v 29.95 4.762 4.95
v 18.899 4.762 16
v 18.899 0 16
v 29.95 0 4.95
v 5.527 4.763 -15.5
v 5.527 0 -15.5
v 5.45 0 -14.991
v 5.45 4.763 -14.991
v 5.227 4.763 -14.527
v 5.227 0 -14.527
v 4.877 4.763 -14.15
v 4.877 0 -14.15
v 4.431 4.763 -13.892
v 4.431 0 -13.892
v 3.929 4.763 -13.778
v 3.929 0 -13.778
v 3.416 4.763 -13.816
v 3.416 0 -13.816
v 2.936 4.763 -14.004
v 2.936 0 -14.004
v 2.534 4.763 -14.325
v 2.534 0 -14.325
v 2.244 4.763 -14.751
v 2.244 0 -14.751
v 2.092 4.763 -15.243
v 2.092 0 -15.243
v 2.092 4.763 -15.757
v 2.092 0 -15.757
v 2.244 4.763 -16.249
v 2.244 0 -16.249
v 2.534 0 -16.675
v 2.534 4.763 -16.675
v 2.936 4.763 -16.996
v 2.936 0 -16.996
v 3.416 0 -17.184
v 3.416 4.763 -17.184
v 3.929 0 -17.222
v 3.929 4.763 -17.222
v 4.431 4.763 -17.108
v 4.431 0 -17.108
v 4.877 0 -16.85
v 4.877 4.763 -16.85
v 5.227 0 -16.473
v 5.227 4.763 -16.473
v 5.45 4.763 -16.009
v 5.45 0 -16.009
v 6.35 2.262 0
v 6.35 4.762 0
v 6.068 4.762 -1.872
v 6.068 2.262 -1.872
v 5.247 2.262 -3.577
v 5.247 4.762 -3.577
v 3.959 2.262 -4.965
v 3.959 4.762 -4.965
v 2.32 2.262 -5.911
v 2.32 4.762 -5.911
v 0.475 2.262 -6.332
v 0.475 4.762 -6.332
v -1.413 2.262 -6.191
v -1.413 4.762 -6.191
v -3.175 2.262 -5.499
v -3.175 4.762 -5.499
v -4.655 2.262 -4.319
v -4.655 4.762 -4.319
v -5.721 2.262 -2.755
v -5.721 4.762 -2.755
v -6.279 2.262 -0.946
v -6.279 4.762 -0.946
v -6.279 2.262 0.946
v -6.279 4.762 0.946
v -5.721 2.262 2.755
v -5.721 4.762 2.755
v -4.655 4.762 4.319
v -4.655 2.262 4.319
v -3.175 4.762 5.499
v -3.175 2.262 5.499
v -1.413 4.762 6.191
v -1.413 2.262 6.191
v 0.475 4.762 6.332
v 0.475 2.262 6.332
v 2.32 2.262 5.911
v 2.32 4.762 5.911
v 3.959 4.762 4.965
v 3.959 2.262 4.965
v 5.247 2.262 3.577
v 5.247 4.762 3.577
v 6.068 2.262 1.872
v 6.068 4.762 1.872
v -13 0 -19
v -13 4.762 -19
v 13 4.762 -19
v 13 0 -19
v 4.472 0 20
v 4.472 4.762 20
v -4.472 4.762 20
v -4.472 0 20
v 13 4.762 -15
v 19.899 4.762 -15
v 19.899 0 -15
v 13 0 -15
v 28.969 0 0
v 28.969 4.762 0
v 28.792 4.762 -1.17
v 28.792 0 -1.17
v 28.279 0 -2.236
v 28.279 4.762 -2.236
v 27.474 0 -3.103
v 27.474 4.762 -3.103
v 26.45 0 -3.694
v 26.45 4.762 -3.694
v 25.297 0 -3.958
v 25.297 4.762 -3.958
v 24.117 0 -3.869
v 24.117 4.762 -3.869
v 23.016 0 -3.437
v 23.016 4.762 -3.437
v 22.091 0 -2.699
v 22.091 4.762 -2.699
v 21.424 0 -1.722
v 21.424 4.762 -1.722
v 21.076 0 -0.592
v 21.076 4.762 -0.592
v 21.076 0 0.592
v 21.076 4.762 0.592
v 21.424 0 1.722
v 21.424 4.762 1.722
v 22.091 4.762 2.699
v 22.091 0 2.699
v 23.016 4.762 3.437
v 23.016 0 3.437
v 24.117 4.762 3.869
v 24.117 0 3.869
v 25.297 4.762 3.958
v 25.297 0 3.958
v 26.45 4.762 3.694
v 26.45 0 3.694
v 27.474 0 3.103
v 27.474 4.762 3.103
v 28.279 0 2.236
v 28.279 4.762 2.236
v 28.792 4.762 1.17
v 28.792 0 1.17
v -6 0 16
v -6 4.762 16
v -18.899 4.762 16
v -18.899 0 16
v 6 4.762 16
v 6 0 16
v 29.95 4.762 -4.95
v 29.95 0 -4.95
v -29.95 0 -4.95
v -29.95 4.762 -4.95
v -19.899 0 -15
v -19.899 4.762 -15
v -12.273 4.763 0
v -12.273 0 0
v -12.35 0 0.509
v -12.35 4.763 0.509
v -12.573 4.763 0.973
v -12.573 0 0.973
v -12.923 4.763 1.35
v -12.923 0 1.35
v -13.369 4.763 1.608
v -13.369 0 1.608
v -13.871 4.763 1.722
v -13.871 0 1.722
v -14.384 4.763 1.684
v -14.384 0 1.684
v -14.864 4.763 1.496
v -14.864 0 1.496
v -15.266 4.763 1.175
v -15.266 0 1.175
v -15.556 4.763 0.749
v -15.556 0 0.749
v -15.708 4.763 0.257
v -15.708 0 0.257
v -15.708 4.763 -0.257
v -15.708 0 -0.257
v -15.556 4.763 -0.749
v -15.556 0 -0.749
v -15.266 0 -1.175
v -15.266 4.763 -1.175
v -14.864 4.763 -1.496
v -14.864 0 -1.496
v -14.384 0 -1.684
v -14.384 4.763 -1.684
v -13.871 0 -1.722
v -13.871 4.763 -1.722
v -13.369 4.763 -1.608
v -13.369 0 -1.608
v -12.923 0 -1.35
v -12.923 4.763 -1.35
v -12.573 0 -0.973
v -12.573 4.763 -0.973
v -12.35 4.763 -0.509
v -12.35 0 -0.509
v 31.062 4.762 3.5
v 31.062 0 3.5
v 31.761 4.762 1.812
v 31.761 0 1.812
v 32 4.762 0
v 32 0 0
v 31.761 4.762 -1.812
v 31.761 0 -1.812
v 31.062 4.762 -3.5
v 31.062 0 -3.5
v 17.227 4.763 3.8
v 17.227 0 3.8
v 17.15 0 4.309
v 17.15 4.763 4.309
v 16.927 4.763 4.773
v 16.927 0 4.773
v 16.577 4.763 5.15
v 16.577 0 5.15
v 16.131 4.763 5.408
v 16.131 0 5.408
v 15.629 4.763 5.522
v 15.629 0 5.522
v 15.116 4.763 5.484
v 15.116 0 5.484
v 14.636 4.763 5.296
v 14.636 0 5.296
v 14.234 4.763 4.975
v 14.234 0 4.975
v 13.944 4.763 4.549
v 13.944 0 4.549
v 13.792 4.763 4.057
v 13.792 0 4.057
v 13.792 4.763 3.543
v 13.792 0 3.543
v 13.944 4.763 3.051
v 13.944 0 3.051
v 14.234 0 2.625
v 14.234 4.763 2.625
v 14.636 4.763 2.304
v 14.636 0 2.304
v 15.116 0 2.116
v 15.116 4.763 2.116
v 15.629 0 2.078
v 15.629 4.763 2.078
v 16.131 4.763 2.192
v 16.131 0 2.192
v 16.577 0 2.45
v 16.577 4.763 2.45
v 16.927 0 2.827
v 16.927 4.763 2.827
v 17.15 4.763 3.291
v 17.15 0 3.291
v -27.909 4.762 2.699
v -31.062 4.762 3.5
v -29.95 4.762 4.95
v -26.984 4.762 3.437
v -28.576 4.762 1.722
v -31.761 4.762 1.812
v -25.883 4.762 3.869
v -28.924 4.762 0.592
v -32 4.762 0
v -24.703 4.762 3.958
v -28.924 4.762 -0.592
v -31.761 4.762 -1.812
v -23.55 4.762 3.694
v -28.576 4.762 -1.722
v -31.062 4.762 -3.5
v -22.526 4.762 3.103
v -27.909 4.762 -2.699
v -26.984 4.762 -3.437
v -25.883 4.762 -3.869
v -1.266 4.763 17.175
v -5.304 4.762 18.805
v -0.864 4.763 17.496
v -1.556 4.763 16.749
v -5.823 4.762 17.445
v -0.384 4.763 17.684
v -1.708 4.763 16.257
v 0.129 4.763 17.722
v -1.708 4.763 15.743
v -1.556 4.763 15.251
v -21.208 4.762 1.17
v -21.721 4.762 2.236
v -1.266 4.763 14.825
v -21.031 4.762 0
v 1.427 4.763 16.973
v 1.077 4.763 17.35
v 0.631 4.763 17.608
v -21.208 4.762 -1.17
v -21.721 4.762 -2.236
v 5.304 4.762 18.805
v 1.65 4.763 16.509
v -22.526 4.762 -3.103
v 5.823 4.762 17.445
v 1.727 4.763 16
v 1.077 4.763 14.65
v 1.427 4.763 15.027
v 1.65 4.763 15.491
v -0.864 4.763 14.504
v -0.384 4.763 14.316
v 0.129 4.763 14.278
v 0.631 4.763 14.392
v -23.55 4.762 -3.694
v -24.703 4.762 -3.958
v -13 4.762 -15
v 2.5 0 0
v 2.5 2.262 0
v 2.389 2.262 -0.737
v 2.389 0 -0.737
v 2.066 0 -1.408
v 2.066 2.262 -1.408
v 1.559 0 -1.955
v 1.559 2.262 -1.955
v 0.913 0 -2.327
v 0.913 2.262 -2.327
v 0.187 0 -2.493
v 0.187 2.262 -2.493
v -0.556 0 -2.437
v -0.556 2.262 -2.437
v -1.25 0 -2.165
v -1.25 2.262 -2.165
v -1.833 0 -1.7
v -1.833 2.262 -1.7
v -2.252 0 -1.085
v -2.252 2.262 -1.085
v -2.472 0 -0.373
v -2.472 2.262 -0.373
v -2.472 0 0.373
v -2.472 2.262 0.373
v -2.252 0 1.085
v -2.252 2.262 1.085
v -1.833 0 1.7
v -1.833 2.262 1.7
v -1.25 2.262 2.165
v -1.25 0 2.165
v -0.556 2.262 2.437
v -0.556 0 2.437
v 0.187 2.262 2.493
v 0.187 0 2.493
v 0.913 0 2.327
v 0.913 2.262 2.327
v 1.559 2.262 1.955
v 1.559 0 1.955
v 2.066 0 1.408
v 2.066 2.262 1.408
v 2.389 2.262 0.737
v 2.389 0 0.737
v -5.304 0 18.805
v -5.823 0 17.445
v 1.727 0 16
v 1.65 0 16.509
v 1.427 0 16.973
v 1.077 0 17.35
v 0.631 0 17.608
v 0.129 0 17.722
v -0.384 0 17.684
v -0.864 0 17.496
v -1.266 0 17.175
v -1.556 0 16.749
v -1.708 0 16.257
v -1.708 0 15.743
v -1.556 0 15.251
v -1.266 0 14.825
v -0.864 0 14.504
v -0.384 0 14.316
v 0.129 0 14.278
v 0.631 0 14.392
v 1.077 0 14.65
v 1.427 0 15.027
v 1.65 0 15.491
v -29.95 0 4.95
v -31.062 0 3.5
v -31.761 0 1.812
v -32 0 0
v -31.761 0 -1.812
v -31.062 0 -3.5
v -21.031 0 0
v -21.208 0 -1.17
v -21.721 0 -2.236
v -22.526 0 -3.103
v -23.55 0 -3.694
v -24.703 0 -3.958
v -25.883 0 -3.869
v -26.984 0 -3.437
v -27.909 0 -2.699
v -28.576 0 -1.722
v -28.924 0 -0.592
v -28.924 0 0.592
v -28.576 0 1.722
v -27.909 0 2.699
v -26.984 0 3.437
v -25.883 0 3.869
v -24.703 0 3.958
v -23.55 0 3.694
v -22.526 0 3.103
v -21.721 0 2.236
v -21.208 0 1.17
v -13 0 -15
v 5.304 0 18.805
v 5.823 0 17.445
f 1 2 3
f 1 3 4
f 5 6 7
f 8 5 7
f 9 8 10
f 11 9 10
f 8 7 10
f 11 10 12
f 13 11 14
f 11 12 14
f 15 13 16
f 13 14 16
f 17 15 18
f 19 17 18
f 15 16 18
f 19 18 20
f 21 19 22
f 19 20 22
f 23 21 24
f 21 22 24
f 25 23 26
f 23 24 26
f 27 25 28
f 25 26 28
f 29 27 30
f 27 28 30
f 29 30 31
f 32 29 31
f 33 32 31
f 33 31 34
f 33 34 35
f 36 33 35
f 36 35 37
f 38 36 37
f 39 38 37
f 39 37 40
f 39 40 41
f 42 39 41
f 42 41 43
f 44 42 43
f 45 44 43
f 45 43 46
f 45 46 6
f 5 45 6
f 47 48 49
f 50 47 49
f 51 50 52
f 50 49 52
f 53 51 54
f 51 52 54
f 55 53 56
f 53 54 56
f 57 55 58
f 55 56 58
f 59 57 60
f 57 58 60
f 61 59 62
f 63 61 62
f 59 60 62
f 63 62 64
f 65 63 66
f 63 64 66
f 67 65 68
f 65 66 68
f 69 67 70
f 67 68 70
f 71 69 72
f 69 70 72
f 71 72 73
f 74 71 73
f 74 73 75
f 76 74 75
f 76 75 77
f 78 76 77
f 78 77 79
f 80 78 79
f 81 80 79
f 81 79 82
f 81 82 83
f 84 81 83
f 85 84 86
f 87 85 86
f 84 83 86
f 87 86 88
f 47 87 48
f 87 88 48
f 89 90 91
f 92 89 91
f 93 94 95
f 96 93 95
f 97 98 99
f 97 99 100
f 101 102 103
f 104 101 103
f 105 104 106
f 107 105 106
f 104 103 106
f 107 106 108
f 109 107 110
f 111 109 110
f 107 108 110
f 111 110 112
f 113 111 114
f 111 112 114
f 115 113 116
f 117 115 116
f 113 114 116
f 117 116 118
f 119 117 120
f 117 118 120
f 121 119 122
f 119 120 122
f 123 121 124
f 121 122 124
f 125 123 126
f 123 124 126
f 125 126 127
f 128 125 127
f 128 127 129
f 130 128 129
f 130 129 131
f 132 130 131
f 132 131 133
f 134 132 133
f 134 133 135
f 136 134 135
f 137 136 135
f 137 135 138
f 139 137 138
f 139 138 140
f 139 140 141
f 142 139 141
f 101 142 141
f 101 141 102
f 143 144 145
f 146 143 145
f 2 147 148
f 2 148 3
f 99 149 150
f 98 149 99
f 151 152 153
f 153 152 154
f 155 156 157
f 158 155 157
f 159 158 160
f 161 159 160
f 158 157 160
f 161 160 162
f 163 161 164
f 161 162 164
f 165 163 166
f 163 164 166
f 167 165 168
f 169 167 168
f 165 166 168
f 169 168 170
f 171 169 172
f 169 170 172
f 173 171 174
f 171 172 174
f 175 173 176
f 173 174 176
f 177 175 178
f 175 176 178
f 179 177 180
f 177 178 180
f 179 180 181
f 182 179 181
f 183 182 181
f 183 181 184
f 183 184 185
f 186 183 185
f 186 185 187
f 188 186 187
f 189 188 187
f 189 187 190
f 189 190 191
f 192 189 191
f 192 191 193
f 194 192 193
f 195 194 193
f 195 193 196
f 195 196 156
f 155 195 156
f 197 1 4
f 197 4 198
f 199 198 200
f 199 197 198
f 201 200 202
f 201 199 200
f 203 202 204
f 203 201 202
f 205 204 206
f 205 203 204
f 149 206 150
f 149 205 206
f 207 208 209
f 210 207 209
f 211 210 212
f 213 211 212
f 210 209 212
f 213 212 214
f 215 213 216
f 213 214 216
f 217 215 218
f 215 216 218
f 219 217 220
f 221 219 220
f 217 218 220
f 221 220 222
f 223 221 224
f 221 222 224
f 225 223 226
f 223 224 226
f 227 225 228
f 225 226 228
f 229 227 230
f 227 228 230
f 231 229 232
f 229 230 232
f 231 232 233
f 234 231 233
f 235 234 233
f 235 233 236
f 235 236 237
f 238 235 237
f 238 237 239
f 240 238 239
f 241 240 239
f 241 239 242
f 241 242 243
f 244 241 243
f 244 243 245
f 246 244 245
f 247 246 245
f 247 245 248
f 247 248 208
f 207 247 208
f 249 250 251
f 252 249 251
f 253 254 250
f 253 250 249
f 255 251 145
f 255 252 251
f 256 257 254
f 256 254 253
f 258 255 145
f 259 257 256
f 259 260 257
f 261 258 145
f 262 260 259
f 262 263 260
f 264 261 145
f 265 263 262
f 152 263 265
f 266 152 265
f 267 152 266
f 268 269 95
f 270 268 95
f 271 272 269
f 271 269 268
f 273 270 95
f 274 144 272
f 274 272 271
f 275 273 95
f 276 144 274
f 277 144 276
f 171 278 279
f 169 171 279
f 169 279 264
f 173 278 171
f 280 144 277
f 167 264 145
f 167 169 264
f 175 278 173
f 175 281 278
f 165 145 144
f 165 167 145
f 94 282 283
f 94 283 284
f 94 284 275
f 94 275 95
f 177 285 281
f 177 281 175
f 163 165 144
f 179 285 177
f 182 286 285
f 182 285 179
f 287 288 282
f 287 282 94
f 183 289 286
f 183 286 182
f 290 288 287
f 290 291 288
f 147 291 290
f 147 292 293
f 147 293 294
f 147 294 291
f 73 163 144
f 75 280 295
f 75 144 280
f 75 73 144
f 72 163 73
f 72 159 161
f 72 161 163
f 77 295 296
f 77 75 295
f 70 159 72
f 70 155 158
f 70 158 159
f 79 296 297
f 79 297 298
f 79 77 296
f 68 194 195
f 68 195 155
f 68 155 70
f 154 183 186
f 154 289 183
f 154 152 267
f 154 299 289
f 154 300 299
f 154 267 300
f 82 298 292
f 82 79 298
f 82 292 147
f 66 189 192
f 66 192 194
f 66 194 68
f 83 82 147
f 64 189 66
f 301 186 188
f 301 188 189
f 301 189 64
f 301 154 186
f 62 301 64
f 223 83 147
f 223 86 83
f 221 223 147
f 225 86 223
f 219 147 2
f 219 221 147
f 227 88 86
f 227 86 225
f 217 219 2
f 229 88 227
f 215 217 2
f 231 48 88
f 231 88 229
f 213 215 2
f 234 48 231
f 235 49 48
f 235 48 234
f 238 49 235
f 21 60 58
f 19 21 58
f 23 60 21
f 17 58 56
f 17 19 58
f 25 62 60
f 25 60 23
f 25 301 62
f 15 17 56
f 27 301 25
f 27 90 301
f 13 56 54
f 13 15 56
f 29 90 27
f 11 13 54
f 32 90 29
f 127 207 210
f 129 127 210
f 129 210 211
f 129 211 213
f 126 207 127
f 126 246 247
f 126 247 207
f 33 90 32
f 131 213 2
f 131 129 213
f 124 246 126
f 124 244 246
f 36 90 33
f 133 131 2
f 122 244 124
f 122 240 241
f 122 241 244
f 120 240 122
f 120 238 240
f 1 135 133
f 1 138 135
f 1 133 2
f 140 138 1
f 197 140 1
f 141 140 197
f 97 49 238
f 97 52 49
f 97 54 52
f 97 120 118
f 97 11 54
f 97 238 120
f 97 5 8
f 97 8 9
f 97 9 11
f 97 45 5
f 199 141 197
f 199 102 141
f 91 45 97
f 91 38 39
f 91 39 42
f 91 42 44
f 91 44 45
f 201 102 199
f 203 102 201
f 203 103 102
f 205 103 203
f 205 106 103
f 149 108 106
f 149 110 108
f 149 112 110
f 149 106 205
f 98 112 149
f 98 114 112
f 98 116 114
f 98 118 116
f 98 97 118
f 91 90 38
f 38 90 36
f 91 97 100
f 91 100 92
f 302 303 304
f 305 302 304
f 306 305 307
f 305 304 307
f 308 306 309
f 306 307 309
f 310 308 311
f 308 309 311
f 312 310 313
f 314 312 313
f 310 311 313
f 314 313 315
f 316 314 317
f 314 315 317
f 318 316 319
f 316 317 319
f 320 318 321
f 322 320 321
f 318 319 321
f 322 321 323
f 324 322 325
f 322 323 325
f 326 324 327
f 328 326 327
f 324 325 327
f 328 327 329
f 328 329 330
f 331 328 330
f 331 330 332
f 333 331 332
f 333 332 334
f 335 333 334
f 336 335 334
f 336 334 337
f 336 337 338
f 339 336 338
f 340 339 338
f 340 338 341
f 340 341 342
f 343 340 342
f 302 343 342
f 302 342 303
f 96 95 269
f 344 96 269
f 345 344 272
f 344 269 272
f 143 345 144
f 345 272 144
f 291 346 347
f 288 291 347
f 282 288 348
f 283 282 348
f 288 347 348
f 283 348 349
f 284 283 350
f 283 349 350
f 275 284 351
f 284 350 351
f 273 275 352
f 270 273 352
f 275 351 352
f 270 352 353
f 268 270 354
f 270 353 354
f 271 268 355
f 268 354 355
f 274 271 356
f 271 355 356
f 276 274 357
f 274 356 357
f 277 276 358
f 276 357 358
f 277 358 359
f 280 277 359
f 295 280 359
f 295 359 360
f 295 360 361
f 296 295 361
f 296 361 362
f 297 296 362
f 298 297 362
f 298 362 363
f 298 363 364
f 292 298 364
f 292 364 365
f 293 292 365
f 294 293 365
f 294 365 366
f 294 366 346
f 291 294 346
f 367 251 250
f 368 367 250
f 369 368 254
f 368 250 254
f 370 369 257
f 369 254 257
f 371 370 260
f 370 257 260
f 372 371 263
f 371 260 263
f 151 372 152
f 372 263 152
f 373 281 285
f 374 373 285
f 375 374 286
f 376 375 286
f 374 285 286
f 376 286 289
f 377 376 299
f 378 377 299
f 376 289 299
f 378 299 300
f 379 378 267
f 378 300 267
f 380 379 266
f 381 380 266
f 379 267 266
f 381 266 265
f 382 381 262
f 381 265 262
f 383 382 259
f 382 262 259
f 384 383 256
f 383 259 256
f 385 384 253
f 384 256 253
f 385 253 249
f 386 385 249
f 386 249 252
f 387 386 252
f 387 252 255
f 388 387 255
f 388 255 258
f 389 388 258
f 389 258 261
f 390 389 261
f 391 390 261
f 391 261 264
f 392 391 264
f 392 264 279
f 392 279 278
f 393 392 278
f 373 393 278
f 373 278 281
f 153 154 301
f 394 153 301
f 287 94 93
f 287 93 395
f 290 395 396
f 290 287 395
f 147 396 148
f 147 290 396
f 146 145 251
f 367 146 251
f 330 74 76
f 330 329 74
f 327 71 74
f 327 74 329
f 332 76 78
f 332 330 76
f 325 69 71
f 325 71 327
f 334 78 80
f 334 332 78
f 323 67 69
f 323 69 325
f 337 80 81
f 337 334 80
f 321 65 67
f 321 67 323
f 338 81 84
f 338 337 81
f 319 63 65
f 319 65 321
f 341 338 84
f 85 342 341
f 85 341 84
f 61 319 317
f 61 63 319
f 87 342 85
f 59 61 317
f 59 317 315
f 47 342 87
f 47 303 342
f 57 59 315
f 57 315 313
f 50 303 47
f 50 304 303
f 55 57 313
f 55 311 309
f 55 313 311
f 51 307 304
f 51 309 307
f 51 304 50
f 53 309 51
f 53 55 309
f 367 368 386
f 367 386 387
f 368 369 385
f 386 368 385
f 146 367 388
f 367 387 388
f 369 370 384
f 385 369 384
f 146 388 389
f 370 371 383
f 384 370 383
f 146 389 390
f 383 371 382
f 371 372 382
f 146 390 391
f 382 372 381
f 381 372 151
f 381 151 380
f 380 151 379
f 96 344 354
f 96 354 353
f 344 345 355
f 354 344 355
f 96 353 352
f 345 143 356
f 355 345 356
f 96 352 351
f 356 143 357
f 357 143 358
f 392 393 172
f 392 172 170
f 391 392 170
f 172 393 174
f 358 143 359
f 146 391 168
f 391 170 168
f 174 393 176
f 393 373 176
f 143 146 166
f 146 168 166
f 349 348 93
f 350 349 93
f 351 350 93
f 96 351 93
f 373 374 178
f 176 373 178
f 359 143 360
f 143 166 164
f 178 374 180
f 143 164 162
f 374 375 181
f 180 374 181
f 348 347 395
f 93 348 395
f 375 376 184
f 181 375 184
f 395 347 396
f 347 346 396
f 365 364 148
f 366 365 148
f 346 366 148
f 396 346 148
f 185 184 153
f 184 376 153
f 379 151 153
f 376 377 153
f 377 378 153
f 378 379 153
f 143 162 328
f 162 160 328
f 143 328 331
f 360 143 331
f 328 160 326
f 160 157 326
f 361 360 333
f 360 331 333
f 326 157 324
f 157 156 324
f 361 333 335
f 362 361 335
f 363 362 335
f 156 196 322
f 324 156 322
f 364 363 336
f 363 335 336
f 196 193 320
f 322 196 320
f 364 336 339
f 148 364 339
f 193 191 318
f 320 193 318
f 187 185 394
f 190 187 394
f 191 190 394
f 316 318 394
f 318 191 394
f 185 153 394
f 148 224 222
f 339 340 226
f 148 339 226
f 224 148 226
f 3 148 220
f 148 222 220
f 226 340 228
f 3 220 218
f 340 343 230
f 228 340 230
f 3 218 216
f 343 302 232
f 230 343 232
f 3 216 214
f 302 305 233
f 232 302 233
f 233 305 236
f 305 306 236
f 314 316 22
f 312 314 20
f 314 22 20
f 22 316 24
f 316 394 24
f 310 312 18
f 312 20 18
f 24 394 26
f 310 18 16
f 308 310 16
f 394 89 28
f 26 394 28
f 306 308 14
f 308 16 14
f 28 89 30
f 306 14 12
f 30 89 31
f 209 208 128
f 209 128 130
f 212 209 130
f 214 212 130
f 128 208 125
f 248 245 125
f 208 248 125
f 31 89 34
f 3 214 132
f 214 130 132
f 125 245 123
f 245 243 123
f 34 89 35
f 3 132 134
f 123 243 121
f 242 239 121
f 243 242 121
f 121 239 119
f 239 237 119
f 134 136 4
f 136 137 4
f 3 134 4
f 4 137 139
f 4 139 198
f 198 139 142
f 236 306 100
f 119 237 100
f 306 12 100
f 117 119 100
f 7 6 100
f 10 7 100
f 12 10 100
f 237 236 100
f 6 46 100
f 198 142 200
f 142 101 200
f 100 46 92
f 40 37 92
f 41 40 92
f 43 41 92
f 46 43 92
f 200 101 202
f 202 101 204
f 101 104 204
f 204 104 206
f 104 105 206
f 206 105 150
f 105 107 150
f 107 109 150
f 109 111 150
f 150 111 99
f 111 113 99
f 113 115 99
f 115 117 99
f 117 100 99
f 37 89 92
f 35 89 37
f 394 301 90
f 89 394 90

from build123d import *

# Parameters (mm, degrees)
SKETCH1_W             = 65
SKETCH1_H             = 45
BOSS_EXTRUDE1_DEPTH   = 4.7625
SKETCH2_R             = 2.5
CUT_EXTRUDE1_DEPTH    = 5.7625
F_8_32_TAPPED_HOLE1_D = 3.4544
SKETCH6_R             = 3.96875
CUT_EXTRUDE2_DEPTH    = 5.7625
CUT_EXTRUDE3_DEPTH    = 5.7625
SKETCH9_R             = 6.35
CUT_EXTRUDE4_DEPTH    = 2.5


with BuildPart() as part:
    # Sketch1 → Boss-Extrude1 (new body)
    with BuildSketch(Plane(origin=(0, 0, 0), x_dir=(1, 0, 0), z_dir=(0, 1, 0))):
        Rectangle(SKETCH1_W, SKETCH1_H)
    extrude(amount=BOSS_EXTRUDE1_DEPTH)

    # Sketch2 → Cut-Extrude1 (cut, through all)
    with BuildSketch(Plane(origin=(0, 4.7625, 0), x_dir=(1, 0, 0), z_dir=(0, 1, 0))):
        Circle(SKETCH2_R)
    extrude(amount=-CUT_EXTRUDE1_DEPTH, mode=Mode.SUBTRACT)

    # #8-32 Tapped Hole1 (through all)
    with Locations(Plane(origin=(-15.76090252, 4.7625, 28.427239646), x_dir=(-1, 0, 0), z_dir=(0, 1, 0))):
        with Locations((-31.26090252, -24.627239646), (-1.76090252, -28.427239646), (-19.56090252, -43.927239646), (-15.76090252, -12.427239646)):
            Hole(F_8_32_TAPPED_HOLE1_D / 2)

    # Sketch6 → Cut-Extrude2 (cut, through all)
    with BuildSketch(Plane(origin=(0, 4.7625, 0), x_dir=(1, 0, 0), z_dir=(0, 1, 0))):
        with Locations((-25, 0)):
            Circle(SKETCH6_R)
        with Locations((25, 0)):
            Circle(SKETCH6_R)
    extrude(amount=-CUT_EXTRUDE2_DEPTH, mode=Mode.SUBTRACT)

    # Sketch8 → Cut-Extrude3 (cut, through all)
    with BuildSketch(Plane(origin=(0, 4.7625, 0), x_dir=(1, 0, 0), z_dir=(0, 1, 0))):
        with BuildLine():
            Line((6, -16), (18.899494937, -16))
            Line((18.899494937, -16), (29.949747468, -4.949747468))
            ThreePointArc((29.949747468, -4.949747468), (32, 0), (29.949747468, 4.949747468))
            Line((29.949747468, 4.949747468), (19.899494937, 15))
            Line((19.899494937, 15), (13, 15))
            Line((13, 15), (13, 19))
            Line((13, 19), (0, 19))
            Line((0, 19), (0, 22.5))
            Line((0, 22.5), (32.5, 22.5))
            Line((32.5, 22.5), (32.5, -22.5))
            Line((32.5, -22.5), (0, -22.5))
            Line((0, -22.5), (0, -20))
            Line((0, -20), (4.472135955, -20))
            ThreePointArc((4.472135955, -20), (5.605034154, -18.140932539), (6, -16))
        make_face()
    cut_extrude3 = extrude(amount=-CUT_EXTRUDE3_DEPTH, mode=Mode.SUBTRACT)

    # Mirror1: Cut-Extrude3 across plane
    add(cut_extrude3.mirror(Plane(origin=(0, 0, 0), x_dir=(0, 0, 1), z_dir=(1, 0, 0))), mode=Mode.SUBTRACT)

    # Sketch9 → Cut-Extrude4 (cut)
    with BuildSketch(Plane(origin=(0, 4.7625, 0), x_dir=(1, 0, 0), z_dir=(0, 1, 0))):
        Circle(SKETCH9_R)
    extrude(amount=-CUT_EXTRUDE4_DEPTH, mode=Mode.SUBTRACT)


solid = part.part
